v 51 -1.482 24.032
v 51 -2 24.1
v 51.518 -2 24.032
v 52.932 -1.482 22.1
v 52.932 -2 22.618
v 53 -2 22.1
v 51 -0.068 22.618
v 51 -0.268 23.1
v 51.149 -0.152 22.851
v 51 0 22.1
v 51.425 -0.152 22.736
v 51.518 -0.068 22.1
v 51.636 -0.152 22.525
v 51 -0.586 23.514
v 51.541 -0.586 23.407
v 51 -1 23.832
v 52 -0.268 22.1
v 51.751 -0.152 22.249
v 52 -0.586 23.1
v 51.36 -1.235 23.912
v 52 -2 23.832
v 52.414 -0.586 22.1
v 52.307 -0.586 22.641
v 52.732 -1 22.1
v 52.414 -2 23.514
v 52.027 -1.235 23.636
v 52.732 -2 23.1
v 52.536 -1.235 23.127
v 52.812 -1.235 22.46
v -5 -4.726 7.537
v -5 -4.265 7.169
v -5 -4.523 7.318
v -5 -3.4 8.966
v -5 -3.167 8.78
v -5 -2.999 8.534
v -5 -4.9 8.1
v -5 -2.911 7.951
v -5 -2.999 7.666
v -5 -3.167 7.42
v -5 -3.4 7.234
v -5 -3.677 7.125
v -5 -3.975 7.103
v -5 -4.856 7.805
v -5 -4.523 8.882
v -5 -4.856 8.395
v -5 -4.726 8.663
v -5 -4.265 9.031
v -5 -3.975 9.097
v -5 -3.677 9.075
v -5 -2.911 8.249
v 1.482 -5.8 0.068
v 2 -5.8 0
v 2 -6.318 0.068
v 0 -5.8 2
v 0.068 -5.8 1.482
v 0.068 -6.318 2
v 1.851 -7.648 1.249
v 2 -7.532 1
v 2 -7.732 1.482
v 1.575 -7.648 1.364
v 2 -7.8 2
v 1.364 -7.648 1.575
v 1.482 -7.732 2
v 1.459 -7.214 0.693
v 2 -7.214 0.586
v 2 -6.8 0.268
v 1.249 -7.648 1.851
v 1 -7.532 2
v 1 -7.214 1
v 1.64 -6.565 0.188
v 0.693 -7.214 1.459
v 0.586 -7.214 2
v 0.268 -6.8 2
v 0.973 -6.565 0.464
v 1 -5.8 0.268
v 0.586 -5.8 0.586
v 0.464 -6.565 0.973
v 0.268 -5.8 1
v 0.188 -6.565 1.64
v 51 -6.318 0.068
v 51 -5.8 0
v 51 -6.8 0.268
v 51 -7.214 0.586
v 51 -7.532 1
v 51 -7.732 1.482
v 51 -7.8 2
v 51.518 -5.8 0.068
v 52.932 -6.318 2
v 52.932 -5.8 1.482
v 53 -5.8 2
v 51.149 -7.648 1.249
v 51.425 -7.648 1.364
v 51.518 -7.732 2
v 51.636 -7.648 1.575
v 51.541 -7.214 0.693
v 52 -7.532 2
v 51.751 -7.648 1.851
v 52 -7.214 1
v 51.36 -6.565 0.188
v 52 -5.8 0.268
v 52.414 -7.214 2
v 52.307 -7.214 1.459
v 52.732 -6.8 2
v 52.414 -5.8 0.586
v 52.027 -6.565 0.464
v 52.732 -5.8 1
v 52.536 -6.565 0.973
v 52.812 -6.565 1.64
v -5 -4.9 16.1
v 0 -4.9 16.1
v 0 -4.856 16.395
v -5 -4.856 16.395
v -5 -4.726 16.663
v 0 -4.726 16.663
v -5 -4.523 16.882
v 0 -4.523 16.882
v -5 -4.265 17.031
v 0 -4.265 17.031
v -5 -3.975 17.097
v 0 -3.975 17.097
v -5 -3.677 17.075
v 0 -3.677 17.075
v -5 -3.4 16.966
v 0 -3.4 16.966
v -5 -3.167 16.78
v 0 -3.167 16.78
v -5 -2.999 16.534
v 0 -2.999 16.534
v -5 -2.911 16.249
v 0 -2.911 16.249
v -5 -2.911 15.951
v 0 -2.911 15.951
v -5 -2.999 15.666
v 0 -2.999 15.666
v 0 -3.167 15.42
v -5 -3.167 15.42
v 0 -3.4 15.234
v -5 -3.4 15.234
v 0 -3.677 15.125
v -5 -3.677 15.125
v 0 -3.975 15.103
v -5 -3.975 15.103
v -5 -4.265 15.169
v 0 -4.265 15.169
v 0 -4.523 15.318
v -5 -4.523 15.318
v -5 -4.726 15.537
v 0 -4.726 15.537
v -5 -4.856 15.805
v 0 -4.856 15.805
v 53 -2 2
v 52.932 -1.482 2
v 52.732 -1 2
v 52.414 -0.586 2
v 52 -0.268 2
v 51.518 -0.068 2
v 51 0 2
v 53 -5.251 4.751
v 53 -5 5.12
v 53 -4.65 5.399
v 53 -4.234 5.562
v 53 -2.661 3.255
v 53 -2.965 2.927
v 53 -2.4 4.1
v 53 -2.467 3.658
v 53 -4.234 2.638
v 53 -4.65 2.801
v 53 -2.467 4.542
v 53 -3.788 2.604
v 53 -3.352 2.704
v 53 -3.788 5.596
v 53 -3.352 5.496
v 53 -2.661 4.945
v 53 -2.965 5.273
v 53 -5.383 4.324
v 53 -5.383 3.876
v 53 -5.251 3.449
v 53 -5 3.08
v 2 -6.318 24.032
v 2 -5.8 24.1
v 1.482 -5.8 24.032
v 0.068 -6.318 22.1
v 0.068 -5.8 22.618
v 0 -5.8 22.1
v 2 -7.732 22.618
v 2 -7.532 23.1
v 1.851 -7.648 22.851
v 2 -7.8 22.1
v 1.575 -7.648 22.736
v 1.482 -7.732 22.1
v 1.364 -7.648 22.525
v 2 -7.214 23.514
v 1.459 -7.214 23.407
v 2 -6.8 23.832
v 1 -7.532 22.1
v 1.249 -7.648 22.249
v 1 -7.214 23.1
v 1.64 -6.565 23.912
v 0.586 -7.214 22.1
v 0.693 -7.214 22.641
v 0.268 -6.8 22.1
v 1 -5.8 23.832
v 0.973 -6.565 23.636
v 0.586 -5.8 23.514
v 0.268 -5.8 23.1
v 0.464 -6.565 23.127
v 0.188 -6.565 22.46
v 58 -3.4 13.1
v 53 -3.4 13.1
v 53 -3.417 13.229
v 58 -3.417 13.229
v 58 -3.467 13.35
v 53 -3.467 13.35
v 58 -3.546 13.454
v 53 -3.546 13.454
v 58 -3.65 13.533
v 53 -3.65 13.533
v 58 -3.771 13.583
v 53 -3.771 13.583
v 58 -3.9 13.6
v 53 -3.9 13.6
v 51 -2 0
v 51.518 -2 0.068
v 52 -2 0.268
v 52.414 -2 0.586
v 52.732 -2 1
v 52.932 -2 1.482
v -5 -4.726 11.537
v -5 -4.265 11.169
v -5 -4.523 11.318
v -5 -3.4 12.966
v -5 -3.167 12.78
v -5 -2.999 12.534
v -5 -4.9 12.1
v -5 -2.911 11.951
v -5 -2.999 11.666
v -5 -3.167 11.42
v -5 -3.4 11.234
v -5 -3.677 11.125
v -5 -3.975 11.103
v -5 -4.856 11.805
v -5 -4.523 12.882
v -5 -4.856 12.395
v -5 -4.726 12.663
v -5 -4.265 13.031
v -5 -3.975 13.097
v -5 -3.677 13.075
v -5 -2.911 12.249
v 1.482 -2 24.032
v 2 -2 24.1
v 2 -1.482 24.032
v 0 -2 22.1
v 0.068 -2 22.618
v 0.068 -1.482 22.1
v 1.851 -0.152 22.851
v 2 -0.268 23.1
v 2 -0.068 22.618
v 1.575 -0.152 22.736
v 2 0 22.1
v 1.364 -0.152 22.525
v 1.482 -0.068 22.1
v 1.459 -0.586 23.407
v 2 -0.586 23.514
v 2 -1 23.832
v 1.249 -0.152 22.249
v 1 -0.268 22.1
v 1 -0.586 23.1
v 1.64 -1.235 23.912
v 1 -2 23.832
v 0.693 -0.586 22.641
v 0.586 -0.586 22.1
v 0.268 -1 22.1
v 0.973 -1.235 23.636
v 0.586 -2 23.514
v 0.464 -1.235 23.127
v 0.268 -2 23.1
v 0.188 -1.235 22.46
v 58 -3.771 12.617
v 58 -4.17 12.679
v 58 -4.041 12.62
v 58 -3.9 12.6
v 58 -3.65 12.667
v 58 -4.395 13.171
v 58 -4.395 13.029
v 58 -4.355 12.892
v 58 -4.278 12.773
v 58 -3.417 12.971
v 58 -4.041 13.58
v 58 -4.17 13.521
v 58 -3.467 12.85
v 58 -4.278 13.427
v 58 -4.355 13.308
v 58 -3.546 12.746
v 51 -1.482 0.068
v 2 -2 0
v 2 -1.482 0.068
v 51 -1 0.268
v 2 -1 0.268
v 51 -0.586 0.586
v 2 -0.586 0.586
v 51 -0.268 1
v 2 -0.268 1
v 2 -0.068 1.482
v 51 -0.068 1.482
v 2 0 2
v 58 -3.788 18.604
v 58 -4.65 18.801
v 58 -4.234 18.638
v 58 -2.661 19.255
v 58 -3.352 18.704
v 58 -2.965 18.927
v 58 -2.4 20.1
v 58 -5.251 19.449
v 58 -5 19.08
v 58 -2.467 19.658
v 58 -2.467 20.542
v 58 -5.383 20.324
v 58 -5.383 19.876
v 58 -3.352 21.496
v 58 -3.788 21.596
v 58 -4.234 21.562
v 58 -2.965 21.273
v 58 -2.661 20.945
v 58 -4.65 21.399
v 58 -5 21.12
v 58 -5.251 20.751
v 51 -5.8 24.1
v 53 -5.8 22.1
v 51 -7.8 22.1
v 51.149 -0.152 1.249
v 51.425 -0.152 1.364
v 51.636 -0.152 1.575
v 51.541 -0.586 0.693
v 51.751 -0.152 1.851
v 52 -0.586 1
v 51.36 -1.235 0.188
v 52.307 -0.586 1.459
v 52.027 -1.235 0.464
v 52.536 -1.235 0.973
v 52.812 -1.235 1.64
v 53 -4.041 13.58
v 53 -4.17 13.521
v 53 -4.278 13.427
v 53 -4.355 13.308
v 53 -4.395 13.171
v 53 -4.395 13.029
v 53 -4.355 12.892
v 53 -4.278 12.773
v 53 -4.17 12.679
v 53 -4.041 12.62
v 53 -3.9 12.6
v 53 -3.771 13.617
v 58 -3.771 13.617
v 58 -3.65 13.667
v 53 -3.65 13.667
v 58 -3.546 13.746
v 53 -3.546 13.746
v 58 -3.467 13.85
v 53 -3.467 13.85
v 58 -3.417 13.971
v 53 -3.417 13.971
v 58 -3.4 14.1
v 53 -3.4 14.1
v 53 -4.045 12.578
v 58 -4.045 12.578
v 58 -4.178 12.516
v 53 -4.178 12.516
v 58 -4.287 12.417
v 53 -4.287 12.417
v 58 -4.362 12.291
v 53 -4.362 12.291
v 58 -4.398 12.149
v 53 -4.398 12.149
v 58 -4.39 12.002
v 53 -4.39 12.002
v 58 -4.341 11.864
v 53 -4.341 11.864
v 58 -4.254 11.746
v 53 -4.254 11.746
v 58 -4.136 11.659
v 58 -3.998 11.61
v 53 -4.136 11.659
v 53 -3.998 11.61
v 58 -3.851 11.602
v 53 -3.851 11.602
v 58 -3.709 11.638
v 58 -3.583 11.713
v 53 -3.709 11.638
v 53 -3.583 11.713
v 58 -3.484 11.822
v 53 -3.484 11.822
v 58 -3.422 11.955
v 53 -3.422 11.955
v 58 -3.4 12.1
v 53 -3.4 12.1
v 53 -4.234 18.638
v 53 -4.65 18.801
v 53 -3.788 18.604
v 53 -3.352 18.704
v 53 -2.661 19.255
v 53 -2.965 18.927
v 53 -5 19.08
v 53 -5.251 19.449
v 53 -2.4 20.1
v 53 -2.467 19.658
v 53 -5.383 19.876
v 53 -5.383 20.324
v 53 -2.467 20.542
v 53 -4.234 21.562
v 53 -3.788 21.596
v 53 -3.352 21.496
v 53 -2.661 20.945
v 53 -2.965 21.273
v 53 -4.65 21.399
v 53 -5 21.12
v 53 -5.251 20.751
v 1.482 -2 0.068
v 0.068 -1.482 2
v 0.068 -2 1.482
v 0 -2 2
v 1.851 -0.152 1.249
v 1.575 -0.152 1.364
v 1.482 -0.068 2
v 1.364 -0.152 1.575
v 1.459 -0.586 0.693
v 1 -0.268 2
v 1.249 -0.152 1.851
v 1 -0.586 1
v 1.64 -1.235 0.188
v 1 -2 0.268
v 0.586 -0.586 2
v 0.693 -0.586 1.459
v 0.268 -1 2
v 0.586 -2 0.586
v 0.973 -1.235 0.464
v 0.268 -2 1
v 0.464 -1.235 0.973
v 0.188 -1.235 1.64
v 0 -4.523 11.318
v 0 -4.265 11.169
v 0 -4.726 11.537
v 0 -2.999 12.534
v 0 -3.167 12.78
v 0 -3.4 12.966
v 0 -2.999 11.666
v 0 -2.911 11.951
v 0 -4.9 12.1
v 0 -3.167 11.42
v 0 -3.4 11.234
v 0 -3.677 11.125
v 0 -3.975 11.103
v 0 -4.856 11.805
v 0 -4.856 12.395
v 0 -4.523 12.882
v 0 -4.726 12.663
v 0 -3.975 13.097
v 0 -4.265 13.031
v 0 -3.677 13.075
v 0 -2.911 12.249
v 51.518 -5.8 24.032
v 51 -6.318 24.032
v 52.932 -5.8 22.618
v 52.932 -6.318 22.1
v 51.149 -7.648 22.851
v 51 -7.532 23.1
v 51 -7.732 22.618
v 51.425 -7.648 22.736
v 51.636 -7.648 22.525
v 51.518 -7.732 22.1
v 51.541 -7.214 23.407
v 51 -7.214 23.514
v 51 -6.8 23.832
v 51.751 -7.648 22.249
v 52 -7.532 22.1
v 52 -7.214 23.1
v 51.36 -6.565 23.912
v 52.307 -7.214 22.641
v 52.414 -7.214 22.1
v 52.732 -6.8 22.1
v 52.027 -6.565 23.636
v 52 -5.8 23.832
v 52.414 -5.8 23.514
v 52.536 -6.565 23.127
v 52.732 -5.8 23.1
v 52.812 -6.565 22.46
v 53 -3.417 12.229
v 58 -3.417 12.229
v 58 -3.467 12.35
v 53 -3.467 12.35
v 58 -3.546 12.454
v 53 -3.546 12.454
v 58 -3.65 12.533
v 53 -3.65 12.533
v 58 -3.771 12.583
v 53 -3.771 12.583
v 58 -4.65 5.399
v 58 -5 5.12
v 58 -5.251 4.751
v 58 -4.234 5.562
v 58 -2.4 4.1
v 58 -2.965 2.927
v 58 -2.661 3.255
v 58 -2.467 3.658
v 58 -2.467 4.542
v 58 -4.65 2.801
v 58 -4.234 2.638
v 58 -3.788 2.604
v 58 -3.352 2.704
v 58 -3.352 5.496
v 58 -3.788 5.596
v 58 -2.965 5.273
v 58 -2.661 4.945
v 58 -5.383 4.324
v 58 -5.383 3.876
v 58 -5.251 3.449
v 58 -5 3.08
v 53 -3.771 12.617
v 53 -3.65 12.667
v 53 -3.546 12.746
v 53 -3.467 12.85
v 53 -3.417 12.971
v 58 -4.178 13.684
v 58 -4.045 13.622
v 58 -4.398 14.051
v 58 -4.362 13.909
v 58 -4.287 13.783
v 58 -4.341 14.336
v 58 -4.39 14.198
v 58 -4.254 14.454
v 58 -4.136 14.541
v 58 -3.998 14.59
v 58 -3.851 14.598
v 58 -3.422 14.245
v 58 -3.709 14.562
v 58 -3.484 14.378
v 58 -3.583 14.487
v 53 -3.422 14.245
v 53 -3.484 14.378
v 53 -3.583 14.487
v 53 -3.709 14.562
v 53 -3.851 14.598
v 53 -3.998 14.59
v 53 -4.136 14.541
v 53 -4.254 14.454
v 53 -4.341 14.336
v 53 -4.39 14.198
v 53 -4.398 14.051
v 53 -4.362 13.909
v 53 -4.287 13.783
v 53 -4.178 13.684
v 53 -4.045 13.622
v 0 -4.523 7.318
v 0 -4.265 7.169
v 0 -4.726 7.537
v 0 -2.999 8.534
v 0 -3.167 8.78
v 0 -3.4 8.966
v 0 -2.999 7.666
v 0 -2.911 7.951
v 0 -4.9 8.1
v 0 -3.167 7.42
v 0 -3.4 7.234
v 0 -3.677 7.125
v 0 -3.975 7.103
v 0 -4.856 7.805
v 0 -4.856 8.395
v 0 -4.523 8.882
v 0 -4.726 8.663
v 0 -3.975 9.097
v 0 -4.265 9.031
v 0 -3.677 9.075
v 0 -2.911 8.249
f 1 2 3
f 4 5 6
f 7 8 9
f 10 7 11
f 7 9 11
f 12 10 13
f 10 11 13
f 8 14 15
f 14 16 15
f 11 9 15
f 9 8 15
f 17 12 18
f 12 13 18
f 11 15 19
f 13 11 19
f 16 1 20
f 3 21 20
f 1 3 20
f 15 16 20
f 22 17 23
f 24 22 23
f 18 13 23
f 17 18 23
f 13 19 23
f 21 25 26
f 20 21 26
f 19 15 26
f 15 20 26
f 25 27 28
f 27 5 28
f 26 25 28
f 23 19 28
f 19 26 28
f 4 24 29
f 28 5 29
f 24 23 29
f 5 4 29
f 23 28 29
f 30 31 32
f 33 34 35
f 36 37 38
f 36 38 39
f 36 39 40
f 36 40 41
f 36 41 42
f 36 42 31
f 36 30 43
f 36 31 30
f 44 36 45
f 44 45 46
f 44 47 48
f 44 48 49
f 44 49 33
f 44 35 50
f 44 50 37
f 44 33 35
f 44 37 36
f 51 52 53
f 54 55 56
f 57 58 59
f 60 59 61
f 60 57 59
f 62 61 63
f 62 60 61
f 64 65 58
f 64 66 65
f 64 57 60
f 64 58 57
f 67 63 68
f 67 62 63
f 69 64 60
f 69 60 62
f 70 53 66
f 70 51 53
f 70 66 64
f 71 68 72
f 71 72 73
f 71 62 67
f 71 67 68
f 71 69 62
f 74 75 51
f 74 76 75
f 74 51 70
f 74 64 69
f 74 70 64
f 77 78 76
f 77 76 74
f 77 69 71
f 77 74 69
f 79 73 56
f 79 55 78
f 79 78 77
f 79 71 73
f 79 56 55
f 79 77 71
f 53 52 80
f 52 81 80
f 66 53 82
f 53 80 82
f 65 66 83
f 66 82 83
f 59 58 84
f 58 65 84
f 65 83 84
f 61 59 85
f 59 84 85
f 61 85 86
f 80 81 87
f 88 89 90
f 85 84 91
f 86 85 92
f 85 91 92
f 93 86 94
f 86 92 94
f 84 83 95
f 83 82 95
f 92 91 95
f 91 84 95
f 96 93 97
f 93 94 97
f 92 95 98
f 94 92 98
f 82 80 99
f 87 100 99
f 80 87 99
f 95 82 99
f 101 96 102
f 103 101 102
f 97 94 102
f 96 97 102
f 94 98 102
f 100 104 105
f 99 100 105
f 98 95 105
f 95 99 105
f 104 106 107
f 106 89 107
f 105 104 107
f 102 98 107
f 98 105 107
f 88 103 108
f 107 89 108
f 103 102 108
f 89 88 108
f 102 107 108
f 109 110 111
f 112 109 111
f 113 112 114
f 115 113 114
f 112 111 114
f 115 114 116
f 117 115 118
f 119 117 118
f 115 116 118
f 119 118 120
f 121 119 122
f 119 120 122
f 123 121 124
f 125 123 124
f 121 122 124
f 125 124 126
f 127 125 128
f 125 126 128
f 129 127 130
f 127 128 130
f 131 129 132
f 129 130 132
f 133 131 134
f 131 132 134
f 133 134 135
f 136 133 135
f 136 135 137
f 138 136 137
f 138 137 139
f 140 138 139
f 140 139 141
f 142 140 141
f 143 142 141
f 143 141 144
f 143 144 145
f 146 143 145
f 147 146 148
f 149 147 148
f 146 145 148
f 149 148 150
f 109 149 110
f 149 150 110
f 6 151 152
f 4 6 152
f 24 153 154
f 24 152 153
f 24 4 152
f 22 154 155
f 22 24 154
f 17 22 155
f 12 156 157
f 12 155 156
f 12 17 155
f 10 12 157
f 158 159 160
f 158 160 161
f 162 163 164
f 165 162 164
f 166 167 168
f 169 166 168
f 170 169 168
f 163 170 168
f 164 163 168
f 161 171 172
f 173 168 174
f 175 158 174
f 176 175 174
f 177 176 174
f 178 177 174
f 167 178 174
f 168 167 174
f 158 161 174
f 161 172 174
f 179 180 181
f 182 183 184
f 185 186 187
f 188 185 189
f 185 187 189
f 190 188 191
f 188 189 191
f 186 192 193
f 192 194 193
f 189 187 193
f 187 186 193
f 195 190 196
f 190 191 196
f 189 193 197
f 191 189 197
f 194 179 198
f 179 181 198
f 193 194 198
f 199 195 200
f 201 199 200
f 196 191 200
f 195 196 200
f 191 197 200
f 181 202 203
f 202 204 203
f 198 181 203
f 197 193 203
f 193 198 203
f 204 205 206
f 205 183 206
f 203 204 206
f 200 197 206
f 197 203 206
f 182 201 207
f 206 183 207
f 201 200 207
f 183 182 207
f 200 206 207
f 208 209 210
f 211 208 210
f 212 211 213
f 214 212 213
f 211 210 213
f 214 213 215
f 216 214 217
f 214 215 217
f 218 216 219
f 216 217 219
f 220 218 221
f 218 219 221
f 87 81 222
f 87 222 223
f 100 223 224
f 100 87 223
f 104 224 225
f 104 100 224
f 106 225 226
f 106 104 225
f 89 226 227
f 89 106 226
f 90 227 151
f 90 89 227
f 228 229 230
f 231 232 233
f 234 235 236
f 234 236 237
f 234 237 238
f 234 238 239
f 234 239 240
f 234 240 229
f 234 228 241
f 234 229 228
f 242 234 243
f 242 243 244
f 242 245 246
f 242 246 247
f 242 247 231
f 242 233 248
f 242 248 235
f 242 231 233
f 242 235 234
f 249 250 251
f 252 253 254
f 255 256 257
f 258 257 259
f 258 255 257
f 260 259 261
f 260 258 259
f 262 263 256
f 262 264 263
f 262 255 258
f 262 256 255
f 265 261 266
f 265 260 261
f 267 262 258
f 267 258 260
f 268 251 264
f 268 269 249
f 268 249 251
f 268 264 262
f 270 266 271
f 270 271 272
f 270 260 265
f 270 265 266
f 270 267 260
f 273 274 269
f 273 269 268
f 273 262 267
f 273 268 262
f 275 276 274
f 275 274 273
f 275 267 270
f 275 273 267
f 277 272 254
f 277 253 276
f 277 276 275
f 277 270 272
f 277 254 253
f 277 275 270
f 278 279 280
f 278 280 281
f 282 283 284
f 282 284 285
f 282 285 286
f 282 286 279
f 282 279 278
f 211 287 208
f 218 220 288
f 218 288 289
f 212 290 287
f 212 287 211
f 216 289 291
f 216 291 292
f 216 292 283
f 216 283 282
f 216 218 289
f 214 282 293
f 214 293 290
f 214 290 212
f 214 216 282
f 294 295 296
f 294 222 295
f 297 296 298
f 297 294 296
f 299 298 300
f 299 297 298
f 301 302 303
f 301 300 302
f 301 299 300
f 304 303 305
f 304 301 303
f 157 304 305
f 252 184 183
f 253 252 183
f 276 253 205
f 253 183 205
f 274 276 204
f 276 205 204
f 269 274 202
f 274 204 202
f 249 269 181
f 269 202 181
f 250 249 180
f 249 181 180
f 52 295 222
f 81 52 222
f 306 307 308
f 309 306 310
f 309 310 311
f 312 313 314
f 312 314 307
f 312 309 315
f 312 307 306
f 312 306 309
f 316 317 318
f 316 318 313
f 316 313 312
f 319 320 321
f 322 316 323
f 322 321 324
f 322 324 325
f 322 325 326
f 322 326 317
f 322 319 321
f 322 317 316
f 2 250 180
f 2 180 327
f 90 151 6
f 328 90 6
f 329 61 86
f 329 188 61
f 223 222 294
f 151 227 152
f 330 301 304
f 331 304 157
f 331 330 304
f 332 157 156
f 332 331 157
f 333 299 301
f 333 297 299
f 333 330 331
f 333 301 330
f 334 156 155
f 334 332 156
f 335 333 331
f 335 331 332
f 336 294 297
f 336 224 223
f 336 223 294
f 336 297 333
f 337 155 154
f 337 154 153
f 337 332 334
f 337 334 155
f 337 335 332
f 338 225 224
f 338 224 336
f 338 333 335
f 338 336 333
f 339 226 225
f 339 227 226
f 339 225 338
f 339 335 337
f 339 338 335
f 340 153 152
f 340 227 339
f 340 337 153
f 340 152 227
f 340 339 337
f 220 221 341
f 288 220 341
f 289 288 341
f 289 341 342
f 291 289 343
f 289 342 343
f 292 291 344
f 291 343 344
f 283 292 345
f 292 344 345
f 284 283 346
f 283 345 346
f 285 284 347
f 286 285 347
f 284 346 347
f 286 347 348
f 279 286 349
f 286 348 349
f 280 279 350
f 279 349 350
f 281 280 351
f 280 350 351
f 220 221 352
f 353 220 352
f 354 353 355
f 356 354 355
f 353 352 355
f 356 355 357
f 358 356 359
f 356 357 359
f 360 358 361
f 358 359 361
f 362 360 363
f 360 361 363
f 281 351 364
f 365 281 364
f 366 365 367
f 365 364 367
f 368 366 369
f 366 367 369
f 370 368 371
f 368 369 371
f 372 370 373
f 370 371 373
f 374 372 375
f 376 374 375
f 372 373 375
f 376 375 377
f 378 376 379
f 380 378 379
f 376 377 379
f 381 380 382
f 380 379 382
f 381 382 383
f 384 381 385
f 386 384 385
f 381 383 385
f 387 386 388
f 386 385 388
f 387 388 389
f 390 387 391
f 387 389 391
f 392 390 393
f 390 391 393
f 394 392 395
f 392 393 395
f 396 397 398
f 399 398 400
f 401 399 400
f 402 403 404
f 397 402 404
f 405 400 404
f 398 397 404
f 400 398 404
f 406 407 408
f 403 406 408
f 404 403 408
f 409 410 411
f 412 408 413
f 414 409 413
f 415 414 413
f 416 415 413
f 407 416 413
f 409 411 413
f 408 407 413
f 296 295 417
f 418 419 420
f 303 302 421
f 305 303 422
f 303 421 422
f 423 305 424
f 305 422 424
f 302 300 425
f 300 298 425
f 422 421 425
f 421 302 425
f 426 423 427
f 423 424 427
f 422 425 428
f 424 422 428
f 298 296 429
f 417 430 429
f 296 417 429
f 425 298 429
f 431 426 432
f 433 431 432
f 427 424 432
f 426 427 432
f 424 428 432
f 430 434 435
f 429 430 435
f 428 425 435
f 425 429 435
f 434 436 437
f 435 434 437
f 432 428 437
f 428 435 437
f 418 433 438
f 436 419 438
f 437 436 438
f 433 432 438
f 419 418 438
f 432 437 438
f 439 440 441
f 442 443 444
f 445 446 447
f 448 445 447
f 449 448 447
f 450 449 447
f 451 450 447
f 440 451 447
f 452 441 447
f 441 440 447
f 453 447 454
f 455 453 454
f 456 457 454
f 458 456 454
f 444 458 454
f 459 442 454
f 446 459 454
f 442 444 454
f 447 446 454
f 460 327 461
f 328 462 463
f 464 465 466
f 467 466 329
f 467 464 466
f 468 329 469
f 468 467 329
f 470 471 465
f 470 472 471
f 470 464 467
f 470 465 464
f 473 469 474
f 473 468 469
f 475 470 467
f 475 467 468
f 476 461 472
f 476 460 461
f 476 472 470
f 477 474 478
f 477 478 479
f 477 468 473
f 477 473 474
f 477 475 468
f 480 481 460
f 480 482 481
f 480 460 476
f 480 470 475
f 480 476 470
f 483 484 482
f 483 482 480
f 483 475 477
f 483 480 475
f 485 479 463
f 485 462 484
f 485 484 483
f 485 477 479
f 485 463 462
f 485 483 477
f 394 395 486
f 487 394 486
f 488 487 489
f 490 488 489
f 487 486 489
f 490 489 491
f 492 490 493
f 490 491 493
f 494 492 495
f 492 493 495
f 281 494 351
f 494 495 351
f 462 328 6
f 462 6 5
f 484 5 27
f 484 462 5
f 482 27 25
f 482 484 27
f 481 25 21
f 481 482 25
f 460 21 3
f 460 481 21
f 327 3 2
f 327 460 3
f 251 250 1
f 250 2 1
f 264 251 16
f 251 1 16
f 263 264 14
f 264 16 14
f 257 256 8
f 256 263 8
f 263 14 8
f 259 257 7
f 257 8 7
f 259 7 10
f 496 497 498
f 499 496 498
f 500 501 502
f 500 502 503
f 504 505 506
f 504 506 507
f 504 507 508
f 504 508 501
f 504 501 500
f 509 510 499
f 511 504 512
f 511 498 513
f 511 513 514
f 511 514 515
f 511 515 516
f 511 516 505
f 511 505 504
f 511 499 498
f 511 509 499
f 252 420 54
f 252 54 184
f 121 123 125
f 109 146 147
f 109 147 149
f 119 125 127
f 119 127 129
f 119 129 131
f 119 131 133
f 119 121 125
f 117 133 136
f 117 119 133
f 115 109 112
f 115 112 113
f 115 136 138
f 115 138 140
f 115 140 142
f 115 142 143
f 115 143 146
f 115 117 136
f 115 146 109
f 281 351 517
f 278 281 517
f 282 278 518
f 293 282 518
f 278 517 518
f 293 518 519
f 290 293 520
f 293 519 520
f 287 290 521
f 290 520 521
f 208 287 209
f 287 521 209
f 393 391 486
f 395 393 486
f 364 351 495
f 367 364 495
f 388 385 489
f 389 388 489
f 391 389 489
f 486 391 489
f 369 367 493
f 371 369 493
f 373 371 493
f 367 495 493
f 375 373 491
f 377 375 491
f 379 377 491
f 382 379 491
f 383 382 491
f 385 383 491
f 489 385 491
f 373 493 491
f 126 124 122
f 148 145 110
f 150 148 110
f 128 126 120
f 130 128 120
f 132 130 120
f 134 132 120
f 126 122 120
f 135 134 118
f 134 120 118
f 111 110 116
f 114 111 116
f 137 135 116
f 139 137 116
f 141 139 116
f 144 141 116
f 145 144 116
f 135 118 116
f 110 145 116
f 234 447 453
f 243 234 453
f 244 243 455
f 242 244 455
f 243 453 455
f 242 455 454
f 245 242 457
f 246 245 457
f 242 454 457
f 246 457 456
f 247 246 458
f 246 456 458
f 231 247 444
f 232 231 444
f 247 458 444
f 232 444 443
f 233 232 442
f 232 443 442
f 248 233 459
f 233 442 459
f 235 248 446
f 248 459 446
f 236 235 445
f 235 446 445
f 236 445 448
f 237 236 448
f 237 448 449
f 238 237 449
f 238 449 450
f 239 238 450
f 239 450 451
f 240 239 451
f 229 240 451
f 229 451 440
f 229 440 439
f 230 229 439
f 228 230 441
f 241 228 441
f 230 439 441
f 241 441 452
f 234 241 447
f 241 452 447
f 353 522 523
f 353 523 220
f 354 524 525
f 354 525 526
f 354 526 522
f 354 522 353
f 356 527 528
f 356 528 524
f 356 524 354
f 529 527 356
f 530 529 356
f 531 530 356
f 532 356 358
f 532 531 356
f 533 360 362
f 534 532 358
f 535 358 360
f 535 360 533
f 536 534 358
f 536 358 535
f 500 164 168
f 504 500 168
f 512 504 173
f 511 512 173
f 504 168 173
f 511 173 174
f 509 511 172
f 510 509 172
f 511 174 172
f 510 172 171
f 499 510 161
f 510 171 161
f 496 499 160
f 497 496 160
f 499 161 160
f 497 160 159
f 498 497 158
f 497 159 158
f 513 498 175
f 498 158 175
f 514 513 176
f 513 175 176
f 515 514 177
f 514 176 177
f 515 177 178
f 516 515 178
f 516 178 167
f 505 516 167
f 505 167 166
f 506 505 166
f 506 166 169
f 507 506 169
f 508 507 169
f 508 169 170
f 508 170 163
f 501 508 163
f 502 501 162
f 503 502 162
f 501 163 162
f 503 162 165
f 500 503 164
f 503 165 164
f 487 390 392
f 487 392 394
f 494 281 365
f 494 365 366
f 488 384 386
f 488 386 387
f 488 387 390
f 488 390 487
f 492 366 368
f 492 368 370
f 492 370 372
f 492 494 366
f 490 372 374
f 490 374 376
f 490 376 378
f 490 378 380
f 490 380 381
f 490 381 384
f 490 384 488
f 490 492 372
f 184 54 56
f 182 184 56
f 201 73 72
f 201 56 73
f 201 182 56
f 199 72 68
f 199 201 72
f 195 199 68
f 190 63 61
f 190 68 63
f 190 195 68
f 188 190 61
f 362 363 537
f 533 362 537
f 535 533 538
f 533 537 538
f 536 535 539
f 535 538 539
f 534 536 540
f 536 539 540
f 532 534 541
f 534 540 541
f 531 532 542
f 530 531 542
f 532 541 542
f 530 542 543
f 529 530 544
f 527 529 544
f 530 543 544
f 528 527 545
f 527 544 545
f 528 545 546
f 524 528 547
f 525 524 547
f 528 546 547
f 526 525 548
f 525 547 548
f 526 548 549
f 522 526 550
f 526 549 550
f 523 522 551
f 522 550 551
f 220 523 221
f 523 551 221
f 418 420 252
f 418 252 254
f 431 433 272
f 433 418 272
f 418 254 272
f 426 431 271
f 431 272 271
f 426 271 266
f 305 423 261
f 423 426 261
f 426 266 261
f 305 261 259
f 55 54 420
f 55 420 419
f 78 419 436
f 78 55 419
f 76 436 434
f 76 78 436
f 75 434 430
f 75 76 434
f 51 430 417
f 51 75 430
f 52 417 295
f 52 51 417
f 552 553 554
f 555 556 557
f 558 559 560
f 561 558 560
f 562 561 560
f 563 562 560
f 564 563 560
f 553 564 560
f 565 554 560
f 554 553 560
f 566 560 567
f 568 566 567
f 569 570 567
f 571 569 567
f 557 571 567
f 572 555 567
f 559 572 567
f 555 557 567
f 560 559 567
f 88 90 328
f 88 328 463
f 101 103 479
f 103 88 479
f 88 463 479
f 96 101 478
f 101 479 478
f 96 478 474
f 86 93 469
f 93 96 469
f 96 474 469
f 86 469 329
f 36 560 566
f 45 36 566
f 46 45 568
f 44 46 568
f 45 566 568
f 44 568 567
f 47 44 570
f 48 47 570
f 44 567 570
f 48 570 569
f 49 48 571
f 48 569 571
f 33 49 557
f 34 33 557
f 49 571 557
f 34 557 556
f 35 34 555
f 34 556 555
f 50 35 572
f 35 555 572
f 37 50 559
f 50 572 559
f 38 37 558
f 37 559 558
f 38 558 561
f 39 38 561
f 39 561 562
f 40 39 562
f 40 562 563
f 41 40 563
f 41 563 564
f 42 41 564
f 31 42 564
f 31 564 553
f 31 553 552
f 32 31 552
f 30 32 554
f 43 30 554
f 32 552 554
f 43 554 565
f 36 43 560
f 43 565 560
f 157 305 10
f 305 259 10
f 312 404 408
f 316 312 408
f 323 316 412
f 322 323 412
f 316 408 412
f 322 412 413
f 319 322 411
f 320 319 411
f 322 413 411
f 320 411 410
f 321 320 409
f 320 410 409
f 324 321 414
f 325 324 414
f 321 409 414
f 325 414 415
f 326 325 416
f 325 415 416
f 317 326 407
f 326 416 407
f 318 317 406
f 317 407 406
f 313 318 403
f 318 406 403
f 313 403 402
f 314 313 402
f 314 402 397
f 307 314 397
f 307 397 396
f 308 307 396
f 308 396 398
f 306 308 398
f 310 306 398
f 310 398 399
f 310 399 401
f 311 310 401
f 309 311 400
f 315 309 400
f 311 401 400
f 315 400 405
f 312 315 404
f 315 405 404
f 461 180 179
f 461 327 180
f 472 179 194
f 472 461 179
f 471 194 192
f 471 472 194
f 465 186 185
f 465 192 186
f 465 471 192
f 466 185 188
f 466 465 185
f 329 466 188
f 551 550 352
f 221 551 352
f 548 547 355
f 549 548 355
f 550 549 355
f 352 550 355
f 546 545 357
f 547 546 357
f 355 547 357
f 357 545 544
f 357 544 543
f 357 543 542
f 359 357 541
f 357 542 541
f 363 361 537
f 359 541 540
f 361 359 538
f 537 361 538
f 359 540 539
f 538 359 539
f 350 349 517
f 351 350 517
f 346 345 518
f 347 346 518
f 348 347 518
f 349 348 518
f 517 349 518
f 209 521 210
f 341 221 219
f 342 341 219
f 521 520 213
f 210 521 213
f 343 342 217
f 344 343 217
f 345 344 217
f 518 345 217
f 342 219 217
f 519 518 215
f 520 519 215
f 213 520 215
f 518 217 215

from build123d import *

# Parameters (mm, degrees)
F0_W     = 53
F0_H     = 24.1
F1_DEPTH = 7.8
F2_R     = 2
F3_R     = 1
F4_DEPTH = 5
F5_R     = 1.5
F6_DEPTH = 5


with BuildPart() as f1:
    # F0 (on Front) → F1 (new body)
    with BuildSketch(Plane.XZ):
        with Locations((26.5, 12.05)):
            Rectangle(F0_W, F0_H)
    extrude(amount=F1_DEPTH)

    # F2
    f2_edges = [f1.edges().sort_by_distance(p)[0] for p in [
        (53, -3.9, 0),
        (0, -3.9, 24.1),
        (53, -3.9, 24.1),
        (0, -3.9, 0),
        (26.5, 0, 0),
        (26.5, -7.8, 0),
        (26.5, 0, 24.1),
        (26.5, -7.8, 24.1),
        (0, 0, 12.05),
        (0, -7.8, 12.05),
        (53, 0, 12.05),
        (53, -7.8, 12.05),
    ]]
    fillet(f2_edges, radius=F2_R)


with BuildPart() as f4:
    # F3 (on face) → F4 (new body)
    with BuildSketch(Plane(origin=(0, 0, 0), x_dir=(0, -1, 0), z_dir=(-1, 0, 0))):
        with Locations((3.9, 16.1)):
            Circle(F3_R)
        with Locations((3.9, 12.1)):
            Circle(F3_R)
        with Locations((3.9, 8.1)):
            Circle(F3_R)
    extrude(amount=F4_DEPTH)


with BuildPart() as f6:
    # F5 (on face) → F6 (new body)
    with BuildSketch(Plane.YZ.offset(53)):
        with Locations((-3.9, 20.1)):
            Circle(F5_R)
        with BuildLine():
            ThreePointArc((-3.9, 13.6), (-3.546447, 13.746447), (-3.4, 14.1))
            ThreePointArc((-3.4, 14.1), (-4.253553, 14.453553), (-3.9, 13.6))
        make_face()
        with BuildLine():
            ThreePointArc((-3.4, 13.1), (-3.546447, 13.453553), (-3.9, 13.6))
            ThreePointArc((-3.9, 13.6), (-4.4, 13.1), (-3.9, 12.6))
            ThreePointArc((-3.9, 12.6), (-3.546447, 12.746447), (-3.4, 13.1))
        make_face()
        with BuildLine():
            ThreePointArc((-3.4, 12.1), (-3.546447, 12.453553), (-3.9, 12.6))
            ThreePointArc((-3.9, 12.6), (-4.253553, 11.746447), (-3.4, 12.1))
        make_face()
        with Locations((-3.9, 4.1)):
            Circle(F5_R)
    extrude(amount=F6_DEPTH)


solid = Compound([f1.part, f4.part, f6.part])
